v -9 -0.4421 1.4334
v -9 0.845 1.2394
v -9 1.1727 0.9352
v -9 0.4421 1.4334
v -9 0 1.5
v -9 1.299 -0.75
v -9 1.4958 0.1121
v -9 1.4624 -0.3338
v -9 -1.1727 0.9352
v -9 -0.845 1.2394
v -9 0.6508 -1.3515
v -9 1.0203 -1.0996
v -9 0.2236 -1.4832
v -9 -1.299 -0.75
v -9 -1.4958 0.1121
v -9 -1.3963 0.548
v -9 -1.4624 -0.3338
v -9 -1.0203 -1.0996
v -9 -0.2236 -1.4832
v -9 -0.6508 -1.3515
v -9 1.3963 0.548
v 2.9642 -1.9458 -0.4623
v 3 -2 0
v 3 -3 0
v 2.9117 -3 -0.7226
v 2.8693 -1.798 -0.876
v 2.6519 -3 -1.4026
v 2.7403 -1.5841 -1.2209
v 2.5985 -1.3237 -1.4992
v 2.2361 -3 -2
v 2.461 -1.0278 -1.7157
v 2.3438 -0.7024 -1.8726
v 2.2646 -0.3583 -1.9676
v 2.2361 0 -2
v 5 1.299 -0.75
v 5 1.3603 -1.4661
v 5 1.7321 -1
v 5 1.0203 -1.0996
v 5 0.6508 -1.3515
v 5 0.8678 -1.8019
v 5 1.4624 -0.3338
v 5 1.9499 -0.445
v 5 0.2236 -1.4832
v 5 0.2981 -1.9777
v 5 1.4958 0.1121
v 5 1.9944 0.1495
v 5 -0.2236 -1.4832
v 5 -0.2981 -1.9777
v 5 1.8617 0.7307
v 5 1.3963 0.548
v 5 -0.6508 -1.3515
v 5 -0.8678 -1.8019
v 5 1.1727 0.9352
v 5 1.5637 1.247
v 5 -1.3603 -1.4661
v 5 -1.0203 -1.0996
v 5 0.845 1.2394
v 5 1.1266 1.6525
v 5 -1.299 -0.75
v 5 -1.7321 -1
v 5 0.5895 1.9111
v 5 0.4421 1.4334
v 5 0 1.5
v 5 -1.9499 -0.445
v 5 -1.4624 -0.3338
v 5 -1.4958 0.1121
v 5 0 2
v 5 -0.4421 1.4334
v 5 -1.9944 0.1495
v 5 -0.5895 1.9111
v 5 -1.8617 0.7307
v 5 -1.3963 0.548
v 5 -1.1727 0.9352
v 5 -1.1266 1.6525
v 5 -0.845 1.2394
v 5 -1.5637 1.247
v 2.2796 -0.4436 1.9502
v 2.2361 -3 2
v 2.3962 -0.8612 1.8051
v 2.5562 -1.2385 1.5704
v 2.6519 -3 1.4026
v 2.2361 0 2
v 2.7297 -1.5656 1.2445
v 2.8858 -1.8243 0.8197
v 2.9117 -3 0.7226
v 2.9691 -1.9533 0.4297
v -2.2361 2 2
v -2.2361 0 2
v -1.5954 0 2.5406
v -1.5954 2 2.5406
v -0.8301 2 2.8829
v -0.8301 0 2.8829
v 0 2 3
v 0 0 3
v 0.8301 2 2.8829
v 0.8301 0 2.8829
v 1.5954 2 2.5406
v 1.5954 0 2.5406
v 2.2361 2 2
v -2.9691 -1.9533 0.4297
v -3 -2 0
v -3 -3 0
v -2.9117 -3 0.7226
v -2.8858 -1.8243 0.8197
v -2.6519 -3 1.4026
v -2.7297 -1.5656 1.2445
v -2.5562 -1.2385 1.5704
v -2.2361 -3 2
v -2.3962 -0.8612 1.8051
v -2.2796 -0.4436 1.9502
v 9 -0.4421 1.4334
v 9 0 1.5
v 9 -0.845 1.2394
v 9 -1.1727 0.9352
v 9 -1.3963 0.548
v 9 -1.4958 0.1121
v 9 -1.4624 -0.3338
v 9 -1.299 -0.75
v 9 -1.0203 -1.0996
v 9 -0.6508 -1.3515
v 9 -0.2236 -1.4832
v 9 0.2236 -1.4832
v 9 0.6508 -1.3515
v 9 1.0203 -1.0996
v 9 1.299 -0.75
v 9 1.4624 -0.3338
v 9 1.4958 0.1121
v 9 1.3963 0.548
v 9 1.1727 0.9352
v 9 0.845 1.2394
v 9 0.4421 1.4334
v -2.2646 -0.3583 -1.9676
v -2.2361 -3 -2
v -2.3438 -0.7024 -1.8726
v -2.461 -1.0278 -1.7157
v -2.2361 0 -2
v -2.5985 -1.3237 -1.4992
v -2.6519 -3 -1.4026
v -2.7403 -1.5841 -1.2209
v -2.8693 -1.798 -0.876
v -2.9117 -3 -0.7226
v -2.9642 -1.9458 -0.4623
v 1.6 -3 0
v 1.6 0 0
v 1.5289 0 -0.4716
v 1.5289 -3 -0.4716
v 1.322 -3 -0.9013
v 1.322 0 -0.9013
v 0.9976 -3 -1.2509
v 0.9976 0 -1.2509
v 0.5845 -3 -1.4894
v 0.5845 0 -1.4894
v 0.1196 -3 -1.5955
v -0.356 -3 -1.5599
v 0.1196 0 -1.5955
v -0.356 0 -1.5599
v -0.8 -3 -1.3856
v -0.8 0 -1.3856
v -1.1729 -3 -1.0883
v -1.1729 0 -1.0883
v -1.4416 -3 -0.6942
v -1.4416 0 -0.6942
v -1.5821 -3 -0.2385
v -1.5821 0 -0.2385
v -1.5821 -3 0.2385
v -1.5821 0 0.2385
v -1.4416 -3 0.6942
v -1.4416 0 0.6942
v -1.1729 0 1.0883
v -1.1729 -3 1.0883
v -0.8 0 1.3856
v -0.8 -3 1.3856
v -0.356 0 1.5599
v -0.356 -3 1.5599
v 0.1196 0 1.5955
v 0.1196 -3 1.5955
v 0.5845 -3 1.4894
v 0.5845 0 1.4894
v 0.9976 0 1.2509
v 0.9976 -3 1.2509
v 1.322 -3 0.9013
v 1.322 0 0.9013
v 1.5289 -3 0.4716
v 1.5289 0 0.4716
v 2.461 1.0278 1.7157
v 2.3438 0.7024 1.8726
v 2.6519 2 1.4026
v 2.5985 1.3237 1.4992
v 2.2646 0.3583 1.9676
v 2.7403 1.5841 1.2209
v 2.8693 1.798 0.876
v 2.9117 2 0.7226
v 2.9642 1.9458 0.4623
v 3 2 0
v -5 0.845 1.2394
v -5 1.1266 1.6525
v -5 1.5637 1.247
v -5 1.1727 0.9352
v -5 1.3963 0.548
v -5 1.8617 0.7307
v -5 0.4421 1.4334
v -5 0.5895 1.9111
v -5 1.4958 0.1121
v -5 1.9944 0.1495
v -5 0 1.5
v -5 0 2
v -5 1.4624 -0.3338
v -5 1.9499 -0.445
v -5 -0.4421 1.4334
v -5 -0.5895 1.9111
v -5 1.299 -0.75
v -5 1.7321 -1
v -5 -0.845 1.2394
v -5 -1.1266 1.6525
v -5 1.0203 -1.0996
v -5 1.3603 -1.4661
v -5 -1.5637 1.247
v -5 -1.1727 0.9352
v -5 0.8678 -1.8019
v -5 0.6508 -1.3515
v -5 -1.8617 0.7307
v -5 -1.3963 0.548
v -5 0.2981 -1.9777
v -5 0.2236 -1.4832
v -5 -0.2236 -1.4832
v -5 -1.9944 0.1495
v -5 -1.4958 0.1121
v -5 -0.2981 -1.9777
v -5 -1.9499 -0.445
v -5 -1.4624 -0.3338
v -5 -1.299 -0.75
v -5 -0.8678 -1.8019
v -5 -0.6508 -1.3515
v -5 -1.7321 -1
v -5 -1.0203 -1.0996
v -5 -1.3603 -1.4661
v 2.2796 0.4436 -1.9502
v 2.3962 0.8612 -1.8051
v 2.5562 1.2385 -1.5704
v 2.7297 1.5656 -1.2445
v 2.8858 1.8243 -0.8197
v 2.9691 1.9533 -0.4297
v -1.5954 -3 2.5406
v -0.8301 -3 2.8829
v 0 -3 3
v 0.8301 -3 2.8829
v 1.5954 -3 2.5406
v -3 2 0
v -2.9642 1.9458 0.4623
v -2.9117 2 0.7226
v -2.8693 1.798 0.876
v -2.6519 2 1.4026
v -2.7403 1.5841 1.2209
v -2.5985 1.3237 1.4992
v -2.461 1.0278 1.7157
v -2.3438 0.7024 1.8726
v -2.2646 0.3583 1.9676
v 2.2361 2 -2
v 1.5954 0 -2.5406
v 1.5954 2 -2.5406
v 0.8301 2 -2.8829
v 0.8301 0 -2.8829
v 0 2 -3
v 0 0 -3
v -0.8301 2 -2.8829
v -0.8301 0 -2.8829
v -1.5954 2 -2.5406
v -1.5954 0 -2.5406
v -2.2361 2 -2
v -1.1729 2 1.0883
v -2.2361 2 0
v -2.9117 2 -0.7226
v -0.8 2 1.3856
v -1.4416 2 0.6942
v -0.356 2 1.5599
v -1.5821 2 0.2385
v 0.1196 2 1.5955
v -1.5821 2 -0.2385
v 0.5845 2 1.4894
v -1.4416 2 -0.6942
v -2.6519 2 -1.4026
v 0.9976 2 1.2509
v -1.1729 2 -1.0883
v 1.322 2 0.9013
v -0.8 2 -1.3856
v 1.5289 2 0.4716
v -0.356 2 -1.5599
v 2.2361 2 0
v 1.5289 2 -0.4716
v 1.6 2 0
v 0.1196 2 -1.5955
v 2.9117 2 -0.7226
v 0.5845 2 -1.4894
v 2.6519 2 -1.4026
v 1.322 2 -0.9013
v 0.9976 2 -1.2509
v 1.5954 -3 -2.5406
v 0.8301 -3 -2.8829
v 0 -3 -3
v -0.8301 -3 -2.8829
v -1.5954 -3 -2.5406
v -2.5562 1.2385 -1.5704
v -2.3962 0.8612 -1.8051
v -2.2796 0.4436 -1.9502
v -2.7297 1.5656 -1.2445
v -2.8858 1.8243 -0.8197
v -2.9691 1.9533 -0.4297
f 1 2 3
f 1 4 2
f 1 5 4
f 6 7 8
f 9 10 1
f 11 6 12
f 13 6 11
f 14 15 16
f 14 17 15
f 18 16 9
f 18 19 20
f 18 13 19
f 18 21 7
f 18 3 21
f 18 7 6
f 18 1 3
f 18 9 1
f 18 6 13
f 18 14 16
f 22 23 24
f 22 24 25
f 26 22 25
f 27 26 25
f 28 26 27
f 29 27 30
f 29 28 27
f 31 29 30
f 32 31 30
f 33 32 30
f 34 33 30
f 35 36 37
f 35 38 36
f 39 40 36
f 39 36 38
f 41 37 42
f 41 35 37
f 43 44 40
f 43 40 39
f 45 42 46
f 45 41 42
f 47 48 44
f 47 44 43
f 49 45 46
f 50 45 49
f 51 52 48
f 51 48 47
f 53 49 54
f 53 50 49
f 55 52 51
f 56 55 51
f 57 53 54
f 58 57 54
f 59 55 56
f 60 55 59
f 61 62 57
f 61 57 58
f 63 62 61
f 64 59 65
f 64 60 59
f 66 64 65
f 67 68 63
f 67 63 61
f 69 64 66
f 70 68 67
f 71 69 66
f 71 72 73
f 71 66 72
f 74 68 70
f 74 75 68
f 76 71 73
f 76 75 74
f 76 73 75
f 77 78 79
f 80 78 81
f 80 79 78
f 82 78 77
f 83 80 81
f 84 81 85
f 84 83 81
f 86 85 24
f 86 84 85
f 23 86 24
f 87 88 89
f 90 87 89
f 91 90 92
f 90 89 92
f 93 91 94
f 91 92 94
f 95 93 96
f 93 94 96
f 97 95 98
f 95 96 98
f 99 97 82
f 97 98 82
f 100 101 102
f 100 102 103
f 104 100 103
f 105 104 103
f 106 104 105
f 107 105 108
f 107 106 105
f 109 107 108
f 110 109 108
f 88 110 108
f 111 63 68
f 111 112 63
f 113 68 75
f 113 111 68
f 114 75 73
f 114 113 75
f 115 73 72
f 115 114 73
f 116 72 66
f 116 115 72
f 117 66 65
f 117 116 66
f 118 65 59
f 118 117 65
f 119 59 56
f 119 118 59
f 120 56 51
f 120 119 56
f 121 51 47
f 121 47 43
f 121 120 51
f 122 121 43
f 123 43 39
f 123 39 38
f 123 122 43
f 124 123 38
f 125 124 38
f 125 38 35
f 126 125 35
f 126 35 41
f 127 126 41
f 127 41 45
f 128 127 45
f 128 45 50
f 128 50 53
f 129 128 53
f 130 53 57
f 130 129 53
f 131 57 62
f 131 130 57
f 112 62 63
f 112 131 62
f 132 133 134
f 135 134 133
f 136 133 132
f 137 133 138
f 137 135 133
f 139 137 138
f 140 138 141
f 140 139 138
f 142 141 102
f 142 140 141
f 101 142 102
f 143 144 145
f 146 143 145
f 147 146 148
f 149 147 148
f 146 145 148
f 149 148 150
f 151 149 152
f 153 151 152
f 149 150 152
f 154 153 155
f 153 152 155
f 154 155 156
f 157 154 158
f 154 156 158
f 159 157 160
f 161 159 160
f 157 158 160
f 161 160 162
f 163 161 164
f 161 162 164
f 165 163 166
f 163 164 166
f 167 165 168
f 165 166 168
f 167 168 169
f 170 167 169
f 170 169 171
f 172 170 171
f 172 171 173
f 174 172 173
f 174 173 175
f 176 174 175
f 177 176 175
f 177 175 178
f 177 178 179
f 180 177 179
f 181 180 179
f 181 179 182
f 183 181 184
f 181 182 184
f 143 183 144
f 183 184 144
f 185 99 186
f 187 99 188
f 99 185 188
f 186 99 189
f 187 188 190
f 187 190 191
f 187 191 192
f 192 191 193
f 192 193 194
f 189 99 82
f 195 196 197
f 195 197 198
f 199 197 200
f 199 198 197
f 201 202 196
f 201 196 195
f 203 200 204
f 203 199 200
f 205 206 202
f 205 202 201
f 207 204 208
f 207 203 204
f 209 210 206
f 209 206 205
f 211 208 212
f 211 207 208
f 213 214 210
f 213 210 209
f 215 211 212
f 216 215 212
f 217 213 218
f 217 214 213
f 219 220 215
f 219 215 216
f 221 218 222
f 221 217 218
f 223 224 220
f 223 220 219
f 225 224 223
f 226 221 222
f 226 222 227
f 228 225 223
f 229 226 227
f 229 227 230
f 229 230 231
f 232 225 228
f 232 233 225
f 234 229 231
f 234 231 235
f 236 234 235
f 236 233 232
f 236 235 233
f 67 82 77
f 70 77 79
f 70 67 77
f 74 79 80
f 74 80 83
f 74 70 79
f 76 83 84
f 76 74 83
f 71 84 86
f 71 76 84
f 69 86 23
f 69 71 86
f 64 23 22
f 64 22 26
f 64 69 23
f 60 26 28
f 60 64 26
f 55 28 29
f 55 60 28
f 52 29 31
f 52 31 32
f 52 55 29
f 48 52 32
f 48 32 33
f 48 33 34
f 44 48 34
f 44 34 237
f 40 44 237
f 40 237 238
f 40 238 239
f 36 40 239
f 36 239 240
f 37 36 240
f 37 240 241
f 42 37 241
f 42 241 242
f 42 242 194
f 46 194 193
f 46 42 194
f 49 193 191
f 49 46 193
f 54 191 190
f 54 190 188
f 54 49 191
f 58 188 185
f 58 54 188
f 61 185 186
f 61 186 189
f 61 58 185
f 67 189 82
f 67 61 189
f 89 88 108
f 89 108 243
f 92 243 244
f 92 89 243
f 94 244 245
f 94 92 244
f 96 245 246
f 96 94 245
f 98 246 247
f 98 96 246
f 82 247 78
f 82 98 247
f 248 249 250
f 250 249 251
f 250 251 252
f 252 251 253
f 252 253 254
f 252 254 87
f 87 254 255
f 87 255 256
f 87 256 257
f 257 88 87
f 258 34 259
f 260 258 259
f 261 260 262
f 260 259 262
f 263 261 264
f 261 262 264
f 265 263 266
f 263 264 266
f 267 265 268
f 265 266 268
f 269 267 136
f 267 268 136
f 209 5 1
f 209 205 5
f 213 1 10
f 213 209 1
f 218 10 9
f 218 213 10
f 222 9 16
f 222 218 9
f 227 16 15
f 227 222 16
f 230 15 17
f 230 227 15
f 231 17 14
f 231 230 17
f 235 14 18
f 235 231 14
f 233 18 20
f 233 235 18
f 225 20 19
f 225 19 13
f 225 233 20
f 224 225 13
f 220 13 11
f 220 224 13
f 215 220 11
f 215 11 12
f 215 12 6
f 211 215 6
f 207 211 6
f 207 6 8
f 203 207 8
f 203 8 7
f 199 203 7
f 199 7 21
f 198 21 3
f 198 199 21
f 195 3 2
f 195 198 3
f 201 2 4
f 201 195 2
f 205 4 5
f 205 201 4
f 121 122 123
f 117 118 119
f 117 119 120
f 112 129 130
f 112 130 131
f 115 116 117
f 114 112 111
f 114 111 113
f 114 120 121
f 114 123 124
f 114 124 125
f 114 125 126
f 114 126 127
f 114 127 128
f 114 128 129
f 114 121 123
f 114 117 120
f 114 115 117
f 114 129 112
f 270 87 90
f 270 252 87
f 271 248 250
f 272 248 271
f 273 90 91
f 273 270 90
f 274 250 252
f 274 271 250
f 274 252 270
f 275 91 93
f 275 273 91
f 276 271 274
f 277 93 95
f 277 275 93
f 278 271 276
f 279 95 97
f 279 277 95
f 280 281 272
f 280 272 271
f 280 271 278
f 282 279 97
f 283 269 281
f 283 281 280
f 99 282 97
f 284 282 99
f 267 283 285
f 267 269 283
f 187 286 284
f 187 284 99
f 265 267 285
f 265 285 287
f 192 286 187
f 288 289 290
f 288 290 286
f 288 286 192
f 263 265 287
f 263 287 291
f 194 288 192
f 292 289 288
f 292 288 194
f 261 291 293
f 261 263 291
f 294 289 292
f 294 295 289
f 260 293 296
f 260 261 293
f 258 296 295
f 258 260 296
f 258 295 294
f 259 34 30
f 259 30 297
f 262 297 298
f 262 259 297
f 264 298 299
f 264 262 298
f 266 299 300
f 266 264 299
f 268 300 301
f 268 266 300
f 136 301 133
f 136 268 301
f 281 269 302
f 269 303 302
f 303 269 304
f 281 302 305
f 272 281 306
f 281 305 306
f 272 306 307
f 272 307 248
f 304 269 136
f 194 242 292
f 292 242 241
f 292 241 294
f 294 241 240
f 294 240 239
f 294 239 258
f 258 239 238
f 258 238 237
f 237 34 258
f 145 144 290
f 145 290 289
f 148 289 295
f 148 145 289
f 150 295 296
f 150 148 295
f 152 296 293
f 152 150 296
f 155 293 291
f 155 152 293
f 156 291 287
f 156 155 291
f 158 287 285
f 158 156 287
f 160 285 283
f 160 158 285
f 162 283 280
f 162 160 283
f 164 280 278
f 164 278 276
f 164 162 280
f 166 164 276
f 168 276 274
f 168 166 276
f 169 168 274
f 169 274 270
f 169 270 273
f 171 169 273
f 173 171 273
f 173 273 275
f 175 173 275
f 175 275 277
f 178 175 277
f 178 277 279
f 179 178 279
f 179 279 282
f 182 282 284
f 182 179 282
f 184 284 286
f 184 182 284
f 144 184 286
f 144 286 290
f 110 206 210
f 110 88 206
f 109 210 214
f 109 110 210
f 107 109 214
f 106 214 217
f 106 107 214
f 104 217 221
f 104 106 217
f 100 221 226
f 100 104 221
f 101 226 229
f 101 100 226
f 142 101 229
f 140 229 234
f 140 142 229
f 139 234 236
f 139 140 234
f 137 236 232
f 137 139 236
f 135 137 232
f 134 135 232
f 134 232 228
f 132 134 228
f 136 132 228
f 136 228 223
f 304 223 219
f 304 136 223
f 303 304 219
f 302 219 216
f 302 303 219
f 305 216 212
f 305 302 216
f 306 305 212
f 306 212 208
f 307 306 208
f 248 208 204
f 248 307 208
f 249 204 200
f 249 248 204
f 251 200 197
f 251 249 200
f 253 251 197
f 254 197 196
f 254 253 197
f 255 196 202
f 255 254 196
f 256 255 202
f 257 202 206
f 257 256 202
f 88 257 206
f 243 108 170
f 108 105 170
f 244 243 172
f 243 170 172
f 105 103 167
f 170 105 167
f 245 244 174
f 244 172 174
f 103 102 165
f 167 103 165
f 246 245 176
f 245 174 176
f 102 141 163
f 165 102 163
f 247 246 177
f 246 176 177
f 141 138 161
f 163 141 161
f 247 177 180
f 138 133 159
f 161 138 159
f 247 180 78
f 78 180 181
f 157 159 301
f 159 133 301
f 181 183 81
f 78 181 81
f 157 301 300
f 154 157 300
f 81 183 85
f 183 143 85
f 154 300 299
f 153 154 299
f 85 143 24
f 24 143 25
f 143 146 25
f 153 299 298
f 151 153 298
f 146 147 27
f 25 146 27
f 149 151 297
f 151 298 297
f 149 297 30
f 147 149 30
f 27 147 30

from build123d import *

# Parameters (mm, degrees)
BOSS_EXTRUDE1_DEPTH      = 2
BOSS_EXTRUDE1_DEPTH_BACK = 3
SKETCH1_5_R              = 3
SKETCH1_5_R_2            = 1.6


with BuildPart() as part:
    # Sketch1 → Revolve2 (revolve)
    with BuildSketch(Plane(origin=(0, 0, 0), x_dir=(1, 0, 0), z_dir=(0, 1, 0))):
        Polygon((-5, -1.5), (-5, -2), (-2.236067977, -2), (-2.236067977, 0), (-9, 0), (-9, -1.5), align=None)
        Polygon((9, 0), (2.236067977, 0), (2.236067977, -2), (5, -2), (5, -1.5), (9, -1.5), align=None)
    revolve(axis=Axis((-9, 0, 0), (1, 0, 0)))

    # Sketch1<5> → Boss-Extrude1 (add, two sides: drawn at the far end of the back side and taken through both)
    with BuildSketch(Plane(origin=(0, 0, 0), x_dir=(1, 0, 0), z_dir=(0, 1, 0)).offset(-BOSS_EXTRUDE1_DEPTH_BACK)):
        Circle(SKETCH1_5_R)
        Circle(SKETCH1_5_R_2, mode=Mode.SUBTRACT)
    extrude(amount=BOSS_EXTRUDE1_DEPTH + BOSS_EXTRUDE1_DEPTH_BACK)


solid = part.part
